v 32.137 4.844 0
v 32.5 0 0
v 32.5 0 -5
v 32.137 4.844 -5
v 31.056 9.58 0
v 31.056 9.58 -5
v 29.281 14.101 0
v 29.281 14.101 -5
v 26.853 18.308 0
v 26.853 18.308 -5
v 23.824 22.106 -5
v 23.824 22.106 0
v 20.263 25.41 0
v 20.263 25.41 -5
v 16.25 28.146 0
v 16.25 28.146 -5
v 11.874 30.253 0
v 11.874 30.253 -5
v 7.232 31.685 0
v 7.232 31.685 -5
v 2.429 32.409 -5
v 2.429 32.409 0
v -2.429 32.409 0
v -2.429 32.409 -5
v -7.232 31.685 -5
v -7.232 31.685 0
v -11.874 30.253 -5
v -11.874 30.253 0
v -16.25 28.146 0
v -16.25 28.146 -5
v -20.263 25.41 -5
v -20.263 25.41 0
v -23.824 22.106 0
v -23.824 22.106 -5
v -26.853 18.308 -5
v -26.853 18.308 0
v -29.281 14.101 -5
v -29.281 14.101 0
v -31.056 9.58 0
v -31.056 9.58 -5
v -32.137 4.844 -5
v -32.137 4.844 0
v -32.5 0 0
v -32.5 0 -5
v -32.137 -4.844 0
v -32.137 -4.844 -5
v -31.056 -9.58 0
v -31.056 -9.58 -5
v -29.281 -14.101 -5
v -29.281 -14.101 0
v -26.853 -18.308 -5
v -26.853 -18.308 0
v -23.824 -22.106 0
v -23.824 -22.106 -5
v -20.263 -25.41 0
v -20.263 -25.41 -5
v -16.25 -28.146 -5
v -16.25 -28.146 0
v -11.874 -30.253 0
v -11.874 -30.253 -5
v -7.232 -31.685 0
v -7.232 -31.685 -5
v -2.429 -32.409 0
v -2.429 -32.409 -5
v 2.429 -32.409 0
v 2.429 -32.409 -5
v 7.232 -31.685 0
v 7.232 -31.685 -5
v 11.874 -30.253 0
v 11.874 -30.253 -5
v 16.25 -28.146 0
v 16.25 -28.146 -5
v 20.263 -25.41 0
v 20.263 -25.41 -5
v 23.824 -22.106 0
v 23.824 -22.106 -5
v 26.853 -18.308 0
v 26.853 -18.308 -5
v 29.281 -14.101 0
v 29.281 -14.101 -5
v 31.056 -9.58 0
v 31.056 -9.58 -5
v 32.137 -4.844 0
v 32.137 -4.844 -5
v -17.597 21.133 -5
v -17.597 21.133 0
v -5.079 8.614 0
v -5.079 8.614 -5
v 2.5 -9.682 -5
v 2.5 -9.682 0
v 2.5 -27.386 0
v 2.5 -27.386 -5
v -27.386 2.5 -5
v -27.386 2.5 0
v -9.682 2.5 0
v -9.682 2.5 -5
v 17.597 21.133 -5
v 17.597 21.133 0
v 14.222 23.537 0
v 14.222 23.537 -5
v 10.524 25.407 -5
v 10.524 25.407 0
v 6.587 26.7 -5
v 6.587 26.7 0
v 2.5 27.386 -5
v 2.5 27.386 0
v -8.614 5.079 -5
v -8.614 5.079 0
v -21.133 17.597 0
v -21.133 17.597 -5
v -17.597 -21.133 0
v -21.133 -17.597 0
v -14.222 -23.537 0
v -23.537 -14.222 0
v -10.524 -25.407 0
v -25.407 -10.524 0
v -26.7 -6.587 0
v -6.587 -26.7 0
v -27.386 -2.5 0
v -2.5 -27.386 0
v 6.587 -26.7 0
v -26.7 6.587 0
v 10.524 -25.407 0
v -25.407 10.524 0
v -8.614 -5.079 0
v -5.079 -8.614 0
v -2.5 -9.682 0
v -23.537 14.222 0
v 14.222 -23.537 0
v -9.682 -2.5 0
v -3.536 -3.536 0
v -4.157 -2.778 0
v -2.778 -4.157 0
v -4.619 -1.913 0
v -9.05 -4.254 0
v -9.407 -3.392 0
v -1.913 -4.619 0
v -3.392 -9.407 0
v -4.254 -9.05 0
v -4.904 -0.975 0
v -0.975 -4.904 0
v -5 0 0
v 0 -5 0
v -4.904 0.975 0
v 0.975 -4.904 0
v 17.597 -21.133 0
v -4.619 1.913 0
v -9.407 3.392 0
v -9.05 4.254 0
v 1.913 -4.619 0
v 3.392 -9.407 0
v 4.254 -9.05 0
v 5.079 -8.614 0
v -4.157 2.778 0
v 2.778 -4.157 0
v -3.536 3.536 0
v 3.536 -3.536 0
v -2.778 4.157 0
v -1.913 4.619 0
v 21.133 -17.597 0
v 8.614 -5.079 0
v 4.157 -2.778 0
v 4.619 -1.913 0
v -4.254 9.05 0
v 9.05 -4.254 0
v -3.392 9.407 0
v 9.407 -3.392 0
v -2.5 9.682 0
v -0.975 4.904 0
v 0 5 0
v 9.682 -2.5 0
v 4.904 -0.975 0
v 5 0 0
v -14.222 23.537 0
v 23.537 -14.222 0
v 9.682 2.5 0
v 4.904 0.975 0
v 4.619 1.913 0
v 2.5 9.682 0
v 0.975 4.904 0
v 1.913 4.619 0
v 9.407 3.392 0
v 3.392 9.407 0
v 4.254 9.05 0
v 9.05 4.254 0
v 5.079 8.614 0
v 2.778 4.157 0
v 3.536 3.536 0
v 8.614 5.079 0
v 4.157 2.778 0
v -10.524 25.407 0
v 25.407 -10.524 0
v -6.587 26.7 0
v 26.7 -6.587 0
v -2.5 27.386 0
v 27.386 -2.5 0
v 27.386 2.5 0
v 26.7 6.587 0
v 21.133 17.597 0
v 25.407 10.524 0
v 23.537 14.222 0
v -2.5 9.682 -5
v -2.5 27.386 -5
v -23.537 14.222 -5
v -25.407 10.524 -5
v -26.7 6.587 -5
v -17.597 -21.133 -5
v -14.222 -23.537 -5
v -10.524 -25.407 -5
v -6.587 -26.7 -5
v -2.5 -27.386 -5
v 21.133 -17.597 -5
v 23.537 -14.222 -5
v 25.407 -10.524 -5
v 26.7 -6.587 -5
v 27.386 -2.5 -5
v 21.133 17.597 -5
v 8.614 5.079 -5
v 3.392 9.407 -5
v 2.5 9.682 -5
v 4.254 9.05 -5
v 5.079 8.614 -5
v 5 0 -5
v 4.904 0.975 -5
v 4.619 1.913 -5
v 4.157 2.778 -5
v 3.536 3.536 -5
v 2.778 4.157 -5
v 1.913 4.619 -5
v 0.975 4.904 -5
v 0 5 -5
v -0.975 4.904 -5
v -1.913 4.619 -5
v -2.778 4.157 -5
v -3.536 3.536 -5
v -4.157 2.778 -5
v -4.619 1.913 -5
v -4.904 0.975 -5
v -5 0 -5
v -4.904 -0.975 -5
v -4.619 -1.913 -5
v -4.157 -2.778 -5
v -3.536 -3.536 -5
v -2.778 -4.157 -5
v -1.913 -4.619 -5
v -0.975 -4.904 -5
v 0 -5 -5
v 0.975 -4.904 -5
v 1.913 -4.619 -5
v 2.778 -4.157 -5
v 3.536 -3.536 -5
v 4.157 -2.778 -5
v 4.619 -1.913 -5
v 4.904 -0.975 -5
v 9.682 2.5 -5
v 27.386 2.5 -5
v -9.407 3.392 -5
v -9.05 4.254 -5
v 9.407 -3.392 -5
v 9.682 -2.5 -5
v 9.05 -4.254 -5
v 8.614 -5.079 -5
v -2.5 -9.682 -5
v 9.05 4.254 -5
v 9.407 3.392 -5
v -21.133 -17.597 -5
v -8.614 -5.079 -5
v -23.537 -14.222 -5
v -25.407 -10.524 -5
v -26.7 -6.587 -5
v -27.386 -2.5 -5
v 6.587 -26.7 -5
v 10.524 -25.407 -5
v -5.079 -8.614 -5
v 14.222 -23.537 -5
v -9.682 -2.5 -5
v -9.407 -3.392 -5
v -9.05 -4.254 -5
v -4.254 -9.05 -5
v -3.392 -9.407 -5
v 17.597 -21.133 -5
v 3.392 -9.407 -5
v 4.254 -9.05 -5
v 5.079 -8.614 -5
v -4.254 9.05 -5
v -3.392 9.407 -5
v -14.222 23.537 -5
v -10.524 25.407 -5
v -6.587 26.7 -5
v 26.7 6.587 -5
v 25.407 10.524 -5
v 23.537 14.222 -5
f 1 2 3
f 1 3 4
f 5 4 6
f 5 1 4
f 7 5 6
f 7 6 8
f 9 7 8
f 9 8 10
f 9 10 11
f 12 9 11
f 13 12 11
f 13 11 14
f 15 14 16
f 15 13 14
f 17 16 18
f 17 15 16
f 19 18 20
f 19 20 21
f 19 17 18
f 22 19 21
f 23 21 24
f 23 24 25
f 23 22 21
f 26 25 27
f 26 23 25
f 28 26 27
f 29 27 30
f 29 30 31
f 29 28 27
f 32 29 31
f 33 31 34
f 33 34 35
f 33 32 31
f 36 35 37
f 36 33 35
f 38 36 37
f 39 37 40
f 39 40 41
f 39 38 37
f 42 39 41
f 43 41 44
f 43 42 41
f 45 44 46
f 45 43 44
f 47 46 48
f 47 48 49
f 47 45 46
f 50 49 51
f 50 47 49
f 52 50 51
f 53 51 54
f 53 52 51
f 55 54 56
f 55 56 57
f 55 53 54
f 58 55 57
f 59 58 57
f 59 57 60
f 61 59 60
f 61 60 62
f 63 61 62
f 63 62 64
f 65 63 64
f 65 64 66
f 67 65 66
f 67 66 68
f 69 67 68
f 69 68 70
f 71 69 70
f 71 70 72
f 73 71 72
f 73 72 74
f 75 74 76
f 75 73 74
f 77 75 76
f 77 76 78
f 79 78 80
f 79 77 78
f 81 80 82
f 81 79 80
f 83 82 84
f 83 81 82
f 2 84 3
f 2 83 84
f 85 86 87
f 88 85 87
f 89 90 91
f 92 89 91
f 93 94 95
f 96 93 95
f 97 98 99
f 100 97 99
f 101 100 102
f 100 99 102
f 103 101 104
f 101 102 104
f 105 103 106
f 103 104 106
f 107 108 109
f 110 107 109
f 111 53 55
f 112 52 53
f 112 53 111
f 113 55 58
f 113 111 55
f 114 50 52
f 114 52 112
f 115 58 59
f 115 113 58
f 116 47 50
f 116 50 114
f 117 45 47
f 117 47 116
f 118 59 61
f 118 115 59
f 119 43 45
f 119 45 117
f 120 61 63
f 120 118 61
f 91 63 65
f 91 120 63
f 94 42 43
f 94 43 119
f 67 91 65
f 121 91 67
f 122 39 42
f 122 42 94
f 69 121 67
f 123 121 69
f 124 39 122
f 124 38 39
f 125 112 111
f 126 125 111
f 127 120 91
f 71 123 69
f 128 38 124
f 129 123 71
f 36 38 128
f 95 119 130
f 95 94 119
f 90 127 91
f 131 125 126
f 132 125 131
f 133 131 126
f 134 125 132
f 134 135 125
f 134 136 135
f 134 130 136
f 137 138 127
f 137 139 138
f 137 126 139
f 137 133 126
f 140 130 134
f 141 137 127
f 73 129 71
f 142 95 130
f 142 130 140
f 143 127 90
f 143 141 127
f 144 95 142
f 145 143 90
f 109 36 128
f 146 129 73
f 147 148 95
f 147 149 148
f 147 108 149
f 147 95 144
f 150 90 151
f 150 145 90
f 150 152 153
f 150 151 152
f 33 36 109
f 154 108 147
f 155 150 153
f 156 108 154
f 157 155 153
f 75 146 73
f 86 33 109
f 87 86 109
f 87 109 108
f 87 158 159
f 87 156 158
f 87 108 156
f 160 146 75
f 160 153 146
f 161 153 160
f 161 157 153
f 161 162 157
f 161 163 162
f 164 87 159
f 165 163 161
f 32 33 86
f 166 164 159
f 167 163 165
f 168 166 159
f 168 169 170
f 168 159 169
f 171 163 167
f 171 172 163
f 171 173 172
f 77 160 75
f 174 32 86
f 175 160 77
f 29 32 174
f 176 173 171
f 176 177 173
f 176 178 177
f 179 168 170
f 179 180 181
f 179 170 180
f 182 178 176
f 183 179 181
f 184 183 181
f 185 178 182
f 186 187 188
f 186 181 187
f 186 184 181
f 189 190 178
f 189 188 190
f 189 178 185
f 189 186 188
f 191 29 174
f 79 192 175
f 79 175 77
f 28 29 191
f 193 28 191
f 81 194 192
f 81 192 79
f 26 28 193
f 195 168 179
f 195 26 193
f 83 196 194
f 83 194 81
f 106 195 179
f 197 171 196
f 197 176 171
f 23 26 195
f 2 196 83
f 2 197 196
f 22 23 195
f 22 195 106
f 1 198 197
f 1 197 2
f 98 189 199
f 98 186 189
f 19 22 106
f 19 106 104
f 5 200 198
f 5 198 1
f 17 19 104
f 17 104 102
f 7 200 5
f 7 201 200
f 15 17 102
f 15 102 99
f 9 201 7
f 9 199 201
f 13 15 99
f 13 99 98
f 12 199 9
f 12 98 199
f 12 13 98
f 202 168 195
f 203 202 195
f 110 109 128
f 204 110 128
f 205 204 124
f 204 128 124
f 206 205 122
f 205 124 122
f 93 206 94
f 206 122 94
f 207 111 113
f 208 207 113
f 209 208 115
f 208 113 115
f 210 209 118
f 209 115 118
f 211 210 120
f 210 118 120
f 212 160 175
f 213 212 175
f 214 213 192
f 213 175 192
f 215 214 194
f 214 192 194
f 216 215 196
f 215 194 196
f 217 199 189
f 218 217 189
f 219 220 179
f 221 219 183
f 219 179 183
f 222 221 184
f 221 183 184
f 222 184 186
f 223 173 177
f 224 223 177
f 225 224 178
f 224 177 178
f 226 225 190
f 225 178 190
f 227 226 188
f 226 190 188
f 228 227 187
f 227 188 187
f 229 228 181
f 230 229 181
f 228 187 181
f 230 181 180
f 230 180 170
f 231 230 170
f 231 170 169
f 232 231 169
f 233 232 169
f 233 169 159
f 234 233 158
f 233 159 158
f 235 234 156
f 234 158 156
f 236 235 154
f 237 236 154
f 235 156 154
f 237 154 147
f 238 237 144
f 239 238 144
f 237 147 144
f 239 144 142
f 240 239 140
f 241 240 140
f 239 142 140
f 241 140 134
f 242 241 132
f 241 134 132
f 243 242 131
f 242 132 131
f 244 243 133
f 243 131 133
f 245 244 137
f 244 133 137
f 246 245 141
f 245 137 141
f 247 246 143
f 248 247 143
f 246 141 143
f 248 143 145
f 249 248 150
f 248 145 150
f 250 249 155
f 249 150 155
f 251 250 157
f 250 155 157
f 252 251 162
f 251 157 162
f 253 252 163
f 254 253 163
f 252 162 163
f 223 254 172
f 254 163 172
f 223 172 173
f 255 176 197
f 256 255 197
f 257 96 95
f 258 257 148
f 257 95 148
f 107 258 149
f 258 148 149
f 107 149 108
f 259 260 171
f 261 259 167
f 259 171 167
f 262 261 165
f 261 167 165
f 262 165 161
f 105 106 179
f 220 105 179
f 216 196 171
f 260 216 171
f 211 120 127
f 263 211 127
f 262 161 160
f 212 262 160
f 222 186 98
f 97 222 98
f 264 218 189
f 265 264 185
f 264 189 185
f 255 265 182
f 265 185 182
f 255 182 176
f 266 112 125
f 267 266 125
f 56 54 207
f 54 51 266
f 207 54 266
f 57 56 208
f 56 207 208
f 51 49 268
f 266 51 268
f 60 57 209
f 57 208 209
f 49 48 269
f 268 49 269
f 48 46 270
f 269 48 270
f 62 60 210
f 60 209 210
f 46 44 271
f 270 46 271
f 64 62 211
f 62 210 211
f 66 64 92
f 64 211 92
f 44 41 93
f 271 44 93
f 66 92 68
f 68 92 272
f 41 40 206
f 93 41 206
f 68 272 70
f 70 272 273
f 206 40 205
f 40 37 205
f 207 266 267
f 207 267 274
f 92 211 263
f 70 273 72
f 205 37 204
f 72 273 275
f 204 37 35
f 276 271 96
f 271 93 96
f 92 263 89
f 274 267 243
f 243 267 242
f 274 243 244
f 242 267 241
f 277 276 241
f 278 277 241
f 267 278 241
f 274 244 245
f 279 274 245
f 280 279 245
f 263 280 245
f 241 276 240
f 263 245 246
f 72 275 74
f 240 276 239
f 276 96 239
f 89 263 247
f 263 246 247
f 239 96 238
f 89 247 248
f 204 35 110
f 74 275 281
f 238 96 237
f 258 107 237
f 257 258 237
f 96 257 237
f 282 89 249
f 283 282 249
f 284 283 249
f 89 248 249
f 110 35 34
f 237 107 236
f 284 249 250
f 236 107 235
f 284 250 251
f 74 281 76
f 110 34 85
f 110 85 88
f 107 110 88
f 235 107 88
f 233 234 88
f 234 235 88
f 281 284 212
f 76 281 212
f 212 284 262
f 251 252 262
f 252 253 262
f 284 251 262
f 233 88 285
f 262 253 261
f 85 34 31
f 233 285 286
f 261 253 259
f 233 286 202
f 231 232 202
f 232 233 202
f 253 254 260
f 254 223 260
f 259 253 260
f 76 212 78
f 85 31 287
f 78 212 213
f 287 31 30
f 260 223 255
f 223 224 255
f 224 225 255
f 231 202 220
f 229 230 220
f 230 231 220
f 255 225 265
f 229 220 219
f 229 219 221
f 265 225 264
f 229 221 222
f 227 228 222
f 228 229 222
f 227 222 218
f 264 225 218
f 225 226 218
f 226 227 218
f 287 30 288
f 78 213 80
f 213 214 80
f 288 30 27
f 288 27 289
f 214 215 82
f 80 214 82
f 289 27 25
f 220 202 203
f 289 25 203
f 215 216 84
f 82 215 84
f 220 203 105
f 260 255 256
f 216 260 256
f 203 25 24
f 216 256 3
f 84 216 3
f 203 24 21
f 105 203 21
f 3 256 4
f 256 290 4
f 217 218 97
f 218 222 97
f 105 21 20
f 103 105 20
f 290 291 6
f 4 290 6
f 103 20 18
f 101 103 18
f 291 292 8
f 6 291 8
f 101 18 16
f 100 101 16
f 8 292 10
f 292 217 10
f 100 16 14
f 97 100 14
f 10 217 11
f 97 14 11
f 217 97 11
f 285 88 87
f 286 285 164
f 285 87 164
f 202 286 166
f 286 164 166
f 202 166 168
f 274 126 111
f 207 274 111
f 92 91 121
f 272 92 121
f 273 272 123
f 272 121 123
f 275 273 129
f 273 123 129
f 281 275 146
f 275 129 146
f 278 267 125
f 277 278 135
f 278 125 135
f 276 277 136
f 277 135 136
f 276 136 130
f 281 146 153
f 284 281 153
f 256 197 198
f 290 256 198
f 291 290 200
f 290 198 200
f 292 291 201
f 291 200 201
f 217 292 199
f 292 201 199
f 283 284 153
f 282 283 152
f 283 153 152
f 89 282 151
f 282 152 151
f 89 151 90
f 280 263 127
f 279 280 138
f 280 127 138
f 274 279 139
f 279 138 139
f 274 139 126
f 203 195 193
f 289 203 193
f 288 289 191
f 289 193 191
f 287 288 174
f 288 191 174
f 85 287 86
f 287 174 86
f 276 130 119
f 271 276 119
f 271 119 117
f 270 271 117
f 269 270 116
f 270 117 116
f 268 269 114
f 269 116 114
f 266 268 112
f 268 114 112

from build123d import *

# Parameters (mm, degrees)
SKIZZE1_R                       = 32.5
SKIZZE1_R_2                     = 5
AUFSATZ_LINEAR_AUSTRAGEN1_DEPTH = 5
SCHNITT_LINEAR_AUSTRAGEN1_DEPTH = 6
KREISMUSTER1_COUNT              = 8


with BuildPart() as part:
    # Skizze1 → Aufsatz-Linear austragen1 (new body)
    with BuildSketch(Plane.XY):
        Circle(SKIZZE1_R)
        Circle(SKIZZE1_R_2, mode=Mode.SUBTRACT)
    extrude(amount=-AUFSATZ_LINEAR_AUSTRAGEN1_DEPTH)

    # Skizze2 → Schnitt-Linear austragen1 (cut, through all)
    with BuildSketch(Plane.XY):
        with BuildLine():
            Line((2.5, 27.386127875), (2.5, 9.682458366))
            ThreePointArc((2.5, 9.682458366), (3.826834324, 9.238795325), (5.078765016, 8.614298922))
            Line((5.078765016, 8.614298922), (17.597149778, 21.132683684))
            ThreePointArc((17.597149778, 21.132683684), (10.52379439, 25.406687144), (2.5, 27.386127875))
        make_face()
    schnitt_linear_austragen1 = extrude(amount=-SCHNITT_LINEAR_AUSTRAGEN1_DEPTH, mode=Mode.SUBTRACT)

    # Kreismuster1: Schnitt-Linear austragen1 ×8 about axis
    kreismuster1_axis = Axis((0, 0, 0), (0, 0, 1))
    for i in range(1, KREISMUSTER1_COUNT):
        add(schnitt_linear_austragen1.rotate(kreismuster1_axis, i * 360 / KREISMUSTER1_COUNT), mode=Mode.SUBTRACT)


solid = part.part
